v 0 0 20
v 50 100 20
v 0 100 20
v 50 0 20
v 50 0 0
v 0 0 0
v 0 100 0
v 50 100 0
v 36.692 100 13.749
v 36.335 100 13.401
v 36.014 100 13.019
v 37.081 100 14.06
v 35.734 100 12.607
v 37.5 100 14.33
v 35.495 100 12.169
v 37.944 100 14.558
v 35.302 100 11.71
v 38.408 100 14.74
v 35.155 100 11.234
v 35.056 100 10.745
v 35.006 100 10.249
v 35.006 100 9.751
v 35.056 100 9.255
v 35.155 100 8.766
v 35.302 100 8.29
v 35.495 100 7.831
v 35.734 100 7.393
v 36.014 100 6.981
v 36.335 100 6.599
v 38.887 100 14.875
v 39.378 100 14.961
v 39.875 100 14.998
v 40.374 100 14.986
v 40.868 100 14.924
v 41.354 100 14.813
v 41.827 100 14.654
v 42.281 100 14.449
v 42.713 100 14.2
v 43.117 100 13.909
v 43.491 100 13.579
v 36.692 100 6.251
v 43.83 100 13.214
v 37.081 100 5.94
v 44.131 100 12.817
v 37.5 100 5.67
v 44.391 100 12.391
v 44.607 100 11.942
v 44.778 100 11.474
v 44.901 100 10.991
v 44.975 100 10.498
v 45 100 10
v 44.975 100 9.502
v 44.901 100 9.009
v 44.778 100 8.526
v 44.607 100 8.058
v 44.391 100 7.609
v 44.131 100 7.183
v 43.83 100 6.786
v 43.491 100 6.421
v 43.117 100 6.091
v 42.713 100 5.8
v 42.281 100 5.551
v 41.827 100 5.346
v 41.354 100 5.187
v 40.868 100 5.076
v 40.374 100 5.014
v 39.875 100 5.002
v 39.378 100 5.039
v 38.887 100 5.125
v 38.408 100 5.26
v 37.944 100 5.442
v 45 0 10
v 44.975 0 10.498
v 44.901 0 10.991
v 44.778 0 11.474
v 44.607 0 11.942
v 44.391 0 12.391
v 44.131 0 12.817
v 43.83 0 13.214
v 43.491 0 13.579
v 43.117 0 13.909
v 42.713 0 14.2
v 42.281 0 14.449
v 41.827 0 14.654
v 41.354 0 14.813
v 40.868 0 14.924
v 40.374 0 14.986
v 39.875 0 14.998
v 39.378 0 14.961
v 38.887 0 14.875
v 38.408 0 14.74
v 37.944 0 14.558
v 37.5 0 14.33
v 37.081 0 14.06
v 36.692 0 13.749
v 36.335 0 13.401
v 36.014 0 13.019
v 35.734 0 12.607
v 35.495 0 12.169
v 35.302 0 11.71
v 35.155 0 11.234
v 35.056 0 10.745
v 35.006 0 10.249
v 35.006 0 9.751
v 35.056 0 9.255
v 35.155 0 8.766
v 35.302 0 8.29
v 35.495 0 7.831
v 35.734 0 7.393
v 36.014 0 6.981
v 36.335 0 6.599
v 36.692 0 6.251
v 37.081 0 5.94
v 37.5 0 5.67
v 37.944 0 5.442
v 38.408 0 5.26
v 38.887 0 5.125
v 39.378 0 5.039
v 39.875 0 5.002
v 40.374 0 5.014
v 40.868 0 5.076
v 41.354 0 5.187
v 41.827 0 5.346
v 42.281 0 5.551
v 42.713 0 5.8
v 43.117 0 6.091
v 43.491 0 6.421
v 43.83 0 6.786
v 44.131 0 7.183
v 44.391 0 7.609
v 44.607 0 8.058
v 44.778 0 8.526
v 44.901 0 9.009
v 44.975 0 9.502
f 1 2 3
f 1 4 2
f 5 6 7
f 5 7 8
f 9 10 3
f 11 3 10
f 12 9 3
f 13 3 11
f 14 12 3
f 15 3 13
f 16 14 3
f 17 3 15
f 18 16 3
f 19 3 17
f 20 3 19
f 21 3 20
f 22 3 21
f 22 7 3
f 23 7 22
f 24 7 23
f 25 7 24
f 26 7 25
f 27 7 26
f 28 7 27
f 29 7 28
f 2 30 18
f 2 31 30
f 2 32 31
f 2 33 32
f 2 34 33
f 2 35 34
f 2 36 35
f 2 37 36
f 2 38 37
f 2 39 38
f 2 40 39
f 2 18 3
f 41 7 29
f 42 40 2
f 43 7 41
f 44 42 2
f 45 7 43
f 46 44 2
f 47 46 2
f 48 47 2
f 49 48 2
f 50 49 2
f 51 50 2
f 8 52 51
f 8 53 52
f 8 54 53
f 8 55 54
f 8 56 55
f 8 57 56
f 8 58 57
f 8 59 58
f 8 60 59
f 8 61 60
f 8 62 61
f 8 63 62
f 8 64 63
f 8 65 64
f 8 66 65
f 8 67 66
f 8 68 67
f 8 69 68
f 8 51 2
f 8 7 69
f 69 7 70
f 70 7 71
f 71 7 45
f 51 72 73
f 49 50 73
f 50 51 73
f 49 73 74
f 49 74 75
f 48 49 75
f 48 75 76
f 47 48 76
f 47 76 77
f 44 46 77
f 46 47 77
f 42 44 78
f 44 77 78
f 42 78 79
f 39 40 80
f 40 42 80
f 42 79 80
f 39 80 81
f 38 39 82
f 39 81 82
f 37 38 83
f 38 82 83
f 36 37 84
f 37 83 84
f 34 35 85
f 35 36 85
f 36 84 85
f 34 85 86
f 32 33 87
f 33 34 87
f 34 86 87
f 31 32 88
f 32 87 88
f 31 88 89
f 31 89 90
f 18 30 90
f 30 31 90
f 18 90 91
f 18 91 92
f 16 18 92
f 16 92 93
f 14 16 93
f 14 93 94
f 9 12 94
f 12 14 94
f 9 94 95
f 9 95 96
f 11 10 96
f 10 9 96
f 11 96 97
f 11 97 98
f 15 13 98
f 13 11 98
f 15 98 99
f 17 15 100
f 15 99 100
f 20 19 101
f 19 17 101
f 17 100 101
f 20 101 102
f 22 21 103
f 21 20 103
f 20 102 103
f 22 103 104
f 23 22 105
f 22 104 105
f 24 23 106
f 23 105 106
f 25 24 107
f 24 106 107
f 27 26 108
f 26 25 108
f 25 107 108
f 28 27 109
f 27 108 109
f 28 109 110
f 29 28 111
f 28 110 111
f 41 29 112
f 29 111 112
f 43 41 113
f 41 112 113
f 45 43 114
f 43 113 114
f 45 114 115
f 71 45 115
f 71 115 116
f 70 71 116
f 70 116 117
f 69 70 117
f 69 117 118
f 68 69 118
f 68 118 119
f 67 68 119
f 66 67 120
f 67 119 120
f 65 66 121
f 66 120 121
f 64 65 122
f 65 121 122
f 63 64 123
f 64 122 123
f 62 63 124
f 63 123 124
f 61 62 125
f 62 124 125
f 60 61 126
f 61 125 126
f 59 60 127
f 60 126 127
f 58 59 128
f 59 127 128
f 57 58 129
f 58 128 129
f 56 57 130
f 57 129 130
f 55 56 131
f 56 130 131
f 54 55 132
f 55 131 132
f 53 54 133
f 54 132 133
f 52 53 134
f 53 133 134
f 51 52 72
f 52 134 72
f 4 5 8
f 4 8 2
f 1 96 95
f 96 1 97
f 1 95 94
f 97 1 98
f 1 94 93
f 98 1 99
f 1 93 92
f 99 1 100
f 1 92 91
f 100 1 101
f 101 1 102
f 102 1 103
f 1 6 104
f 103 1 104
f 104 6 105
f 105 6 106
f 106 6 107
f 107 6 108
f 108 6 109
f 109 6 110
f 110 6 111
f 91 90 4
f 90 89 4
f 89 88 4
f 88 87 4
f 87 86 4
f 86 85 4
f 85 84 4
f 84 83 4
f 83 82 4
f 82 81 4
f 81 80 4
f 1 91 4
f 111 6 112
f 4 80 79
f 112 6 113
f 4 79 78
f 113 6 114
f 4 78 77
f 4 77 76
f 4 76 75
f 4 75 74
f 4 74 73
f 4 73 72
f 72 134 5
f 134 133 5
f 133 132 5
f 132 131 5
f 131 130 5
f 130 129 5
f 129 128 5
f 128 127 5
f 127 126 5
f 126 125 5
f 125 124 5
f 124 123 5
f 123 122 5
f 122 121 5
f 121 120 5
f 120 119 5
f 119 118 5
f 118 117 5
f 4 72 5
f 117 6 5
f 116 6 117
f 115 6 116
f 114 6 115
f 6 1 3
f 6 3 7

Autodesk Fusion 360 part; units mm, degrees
sketch "Sketch1" plane through (0, 0, 0) normal (0, 1, 0) x (1, 0, 0)
  line L0 (0, 0) -> (50, 0)
  line L1 (50, 0) -> (50, -20)
  line L2 (50, -20) -> (0, -20)
  line L3 (0, -20) -> (0, 0)
  circle A0 centre (40, -10) radius 5
  dimension "d1" = 50
  dimension "d2" = 20
  dimension "d3" = 10
extrude "Extrude1" add sketch "Sketch1" along normal blind 100
